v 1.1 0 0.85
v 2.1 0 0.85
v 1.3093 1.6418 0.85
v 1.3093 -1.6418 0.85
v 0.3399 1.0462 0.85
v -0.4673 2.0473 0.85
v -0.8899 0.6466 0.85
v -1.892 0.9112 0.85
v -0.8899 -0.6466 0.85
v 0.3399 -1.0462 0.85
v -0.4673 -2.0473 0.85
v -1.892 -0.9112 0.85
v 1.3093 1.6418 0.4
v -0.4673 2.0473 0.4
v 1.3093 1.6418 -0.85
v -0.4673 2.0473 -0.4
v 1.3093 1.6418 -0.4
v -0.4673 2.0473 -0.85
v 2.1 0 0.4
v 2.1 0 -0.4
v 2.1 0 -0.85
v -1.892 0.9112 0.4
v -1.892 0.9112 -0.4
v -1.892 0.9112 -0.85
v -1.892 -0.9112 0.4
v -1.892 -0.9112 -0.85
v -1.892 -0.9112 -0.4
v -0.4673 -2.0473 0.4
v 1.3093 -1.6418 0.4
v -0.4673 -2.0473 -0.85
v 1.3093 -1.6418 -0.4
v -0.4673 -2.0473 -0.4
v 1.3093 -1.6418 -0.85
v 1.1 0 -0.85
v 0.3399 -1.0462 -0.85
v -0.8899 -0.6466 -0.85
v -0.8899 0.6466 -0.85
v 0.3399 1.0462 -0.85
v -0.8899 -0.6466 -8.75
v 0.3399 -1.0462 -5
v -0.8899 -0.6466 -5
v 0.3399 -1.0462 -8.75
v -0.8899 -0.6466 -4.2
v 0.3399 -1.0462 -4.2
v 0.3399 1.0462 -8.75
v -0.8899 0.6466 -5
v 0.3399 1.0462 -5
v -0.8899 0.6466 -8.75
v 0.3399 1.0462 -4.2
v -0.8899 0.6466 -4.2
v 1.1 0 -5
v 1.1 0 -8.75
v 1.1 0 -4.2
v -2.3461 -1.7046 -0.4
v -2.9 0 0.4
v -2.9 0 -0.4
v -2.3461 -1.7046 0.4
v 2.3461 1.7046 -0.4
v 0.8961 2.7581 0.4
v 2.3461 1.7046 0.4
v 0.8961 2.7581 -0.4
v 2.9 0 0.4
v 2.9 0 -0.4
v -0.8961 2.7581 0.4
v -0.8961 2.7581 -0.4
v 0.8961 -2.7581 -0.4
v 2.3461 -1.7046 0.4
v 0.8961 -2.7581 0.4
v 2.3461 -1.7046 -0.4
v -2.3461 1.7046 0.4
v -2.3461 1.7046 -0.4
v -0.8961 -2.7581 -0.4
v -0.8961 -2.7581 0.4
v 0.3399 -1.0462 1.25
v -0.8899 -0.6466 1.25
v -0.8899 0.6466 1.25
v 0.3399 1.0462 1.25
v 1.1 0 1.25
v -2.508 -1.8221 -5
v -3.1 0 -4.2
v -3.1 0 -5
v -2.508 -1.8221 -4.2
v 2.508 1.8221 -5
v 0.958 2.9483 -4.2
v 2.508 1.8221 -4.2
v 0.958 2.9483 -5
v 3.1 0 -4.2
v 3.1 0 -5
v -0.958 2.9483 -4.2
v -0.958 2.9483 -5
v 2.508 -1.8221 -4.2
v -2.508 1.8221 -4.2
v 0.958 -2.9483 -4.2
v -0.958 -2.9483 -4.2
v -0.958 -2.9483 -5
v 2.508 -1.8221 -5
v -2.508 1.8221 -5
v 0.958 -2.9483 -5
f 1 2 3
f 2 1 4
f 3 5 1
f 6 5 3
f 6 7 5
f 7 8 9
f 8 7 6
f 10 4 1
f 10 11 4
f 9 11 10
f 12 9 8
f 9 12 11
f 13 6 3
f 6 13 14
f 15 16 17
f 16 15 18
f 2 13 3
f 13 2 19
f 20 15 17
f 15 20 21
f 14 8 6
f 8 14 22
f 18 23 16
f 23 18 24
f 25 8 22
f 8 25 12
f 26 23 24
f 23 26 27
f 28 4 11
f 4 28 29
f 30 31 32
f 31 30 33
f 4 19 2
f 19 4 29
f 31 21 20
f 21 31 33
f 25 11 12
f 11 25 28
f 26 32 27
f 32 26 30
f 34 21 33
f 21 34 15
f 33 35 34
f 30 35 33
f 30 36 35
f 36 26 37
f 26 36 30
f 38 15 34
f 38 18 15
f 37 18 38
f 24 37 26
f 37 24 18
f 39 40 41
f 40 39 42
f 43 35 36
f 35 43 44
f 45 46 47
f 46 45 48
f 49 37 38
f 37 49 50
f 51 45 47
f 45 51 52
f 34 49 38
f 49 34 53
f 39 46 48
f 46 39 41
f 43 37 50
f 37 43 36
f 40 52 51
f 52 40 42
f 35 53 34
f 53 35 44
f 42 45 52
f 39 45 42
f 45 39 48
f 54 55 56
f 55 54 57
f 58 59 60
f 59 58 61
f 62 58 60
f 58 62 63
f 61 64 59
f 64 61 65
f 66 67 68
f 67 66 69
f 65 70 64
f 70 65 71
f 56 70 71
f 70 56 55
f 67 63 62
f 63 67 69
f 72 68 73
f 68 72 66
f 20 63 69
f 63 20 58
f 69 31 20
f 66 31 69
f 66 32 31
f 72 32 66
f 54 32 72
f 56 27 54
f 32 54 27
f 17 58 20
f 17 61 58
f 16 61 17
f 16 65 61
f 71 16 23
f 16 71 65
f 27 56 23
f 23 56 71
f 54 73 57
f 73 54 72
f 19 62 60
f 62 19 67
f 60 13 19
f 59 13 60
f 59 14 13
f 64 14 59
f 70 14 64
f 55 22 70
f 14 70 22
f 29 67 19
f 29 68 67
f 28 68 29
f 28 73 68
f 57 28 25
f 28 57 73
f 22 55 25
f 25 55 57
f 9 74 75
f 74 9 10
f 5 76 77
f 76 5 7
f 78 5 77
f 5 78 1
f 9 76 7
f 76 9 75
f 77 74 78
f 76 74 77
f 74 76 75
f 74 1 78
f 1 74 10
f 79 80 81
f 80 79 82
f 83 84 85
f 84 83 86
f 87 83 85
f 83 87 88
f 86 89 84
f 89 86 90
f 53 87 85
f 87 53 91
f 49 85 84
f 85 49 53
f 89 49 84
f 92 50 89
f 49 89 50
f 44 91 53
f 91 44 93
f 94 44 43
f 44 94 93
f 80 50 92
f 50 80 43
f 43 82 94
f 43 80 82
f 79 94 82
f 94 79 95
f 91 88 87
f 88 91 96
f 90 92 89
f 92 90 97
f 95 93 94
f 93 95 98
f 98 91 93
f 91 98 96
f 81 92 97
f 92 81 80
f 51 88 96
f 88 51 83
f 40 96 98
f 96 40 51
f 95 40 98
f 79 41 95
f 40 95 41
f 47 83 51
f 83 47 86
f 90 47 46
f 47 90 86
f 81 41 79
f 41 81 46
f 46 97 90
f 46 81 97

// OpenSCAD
// Parameters
shaft_diameter = 2.2; //[1.1:4.4:0.1]
shaft_radius = 1.1; //[0.55:2.2:0.05]
length = 10; //[5:20:0.5]
head_diameter = 4.2; //[2.1:8.4:0.1]
head_radius = 2.1; //[1.05:4.2:0.05]
head_height = 1.7; //[0.85:3.4:0.05]
threaded = 0; //[0:1:1]
drive_recess = 0; //[0:1:1]
overlap = 0.8; //[0.5:2:0.1]
recess_radius = 1.2; //[0.6:2.0:0.05]
recess_depth = 0.9; //[0.4:1.4:0.05]
recess_slot_width = 0.6; //[0.3:1.2:0.05]
thread_placeholder_radius = 1.25; //[0.8:2.2:0.05]

// Screw components
module screw_shaft() {
  translate([0, 0, -head_height/2 - (length - head_height)/2 + overlap/2])
    cylinder(r=shaft_radius, h=length - head_height, center=true);
}

module pan_head() {
  translate([0, 0, 0])
    cylinder(r=head_radius, h=head_height, center=true);
}

module drive_recess_slot_x() {
  translate([0, 0, head_height/2 - (recess_depth + overlap)/2])
    cube([2*recess_radius, recess_slot_width, recess_depth + overlap], center=true);
}

module drive_recess_slot_y() {
  translate([0, 0, head_height/2 - (recess_depth + overlap)/2])
    cube([recess_slot_width, 2*recess_radius, recess_depth + overlap], center=true);
}

module thread_optional() {
  translate([0, 0, -head_height/2 - (length - head_height)/2 + overlap/2])
    cylinder(r=thread_placeholder_radius, h=length - head_height, center=true);
}

// Mandatory components
module pcb_spacer() {
  color([0.85, 0.85, 0.8]) {
    difference() {
      cylinder(r=shaft_radius + 1.8, h=overlap, center=true);
      translate([0, 0, -overlap/2])
        cylinder(r=shaft_radius, h=overlap, center=true);
    }
  }
}

module screw_and_washer() {
  color([0.75, 0.75, 0.77]) {
    union() {
      translate([0, 0, head_height/2 - overlap/2])
        cylinder(r=shaft_radius + 1, h=overlap, center=true);
      translate([0, 0, head_height/2])
        cylinder(r=shaft_radius, h=overlap, center=true);
    }
  }
}

module buzzer() {
  color([0.1, 0.1, 0.6]) {
    translate([0, 0, -length/2 + overlap/2])
      cylinder(r=shaft_radius + 2, h=overlap, center=true);
  }
}

// Assembly
module assembly() {
  union() {
    if (drive_recess) {
      difference() {
        union() {
          pan_head();
          screw_shaft();
        }
        union() {
          drive_recess_slot_x();
          drive_recess_slot_y();
        }
      }
    } else {
      union() {
        pan_head();
        screw_shaft();
      }
    }
    if (threaded) {
      thread_optional();
    }
    pcb_spacer();
    screw_and_washer();
    buzzer();
  }
}

assembly();
